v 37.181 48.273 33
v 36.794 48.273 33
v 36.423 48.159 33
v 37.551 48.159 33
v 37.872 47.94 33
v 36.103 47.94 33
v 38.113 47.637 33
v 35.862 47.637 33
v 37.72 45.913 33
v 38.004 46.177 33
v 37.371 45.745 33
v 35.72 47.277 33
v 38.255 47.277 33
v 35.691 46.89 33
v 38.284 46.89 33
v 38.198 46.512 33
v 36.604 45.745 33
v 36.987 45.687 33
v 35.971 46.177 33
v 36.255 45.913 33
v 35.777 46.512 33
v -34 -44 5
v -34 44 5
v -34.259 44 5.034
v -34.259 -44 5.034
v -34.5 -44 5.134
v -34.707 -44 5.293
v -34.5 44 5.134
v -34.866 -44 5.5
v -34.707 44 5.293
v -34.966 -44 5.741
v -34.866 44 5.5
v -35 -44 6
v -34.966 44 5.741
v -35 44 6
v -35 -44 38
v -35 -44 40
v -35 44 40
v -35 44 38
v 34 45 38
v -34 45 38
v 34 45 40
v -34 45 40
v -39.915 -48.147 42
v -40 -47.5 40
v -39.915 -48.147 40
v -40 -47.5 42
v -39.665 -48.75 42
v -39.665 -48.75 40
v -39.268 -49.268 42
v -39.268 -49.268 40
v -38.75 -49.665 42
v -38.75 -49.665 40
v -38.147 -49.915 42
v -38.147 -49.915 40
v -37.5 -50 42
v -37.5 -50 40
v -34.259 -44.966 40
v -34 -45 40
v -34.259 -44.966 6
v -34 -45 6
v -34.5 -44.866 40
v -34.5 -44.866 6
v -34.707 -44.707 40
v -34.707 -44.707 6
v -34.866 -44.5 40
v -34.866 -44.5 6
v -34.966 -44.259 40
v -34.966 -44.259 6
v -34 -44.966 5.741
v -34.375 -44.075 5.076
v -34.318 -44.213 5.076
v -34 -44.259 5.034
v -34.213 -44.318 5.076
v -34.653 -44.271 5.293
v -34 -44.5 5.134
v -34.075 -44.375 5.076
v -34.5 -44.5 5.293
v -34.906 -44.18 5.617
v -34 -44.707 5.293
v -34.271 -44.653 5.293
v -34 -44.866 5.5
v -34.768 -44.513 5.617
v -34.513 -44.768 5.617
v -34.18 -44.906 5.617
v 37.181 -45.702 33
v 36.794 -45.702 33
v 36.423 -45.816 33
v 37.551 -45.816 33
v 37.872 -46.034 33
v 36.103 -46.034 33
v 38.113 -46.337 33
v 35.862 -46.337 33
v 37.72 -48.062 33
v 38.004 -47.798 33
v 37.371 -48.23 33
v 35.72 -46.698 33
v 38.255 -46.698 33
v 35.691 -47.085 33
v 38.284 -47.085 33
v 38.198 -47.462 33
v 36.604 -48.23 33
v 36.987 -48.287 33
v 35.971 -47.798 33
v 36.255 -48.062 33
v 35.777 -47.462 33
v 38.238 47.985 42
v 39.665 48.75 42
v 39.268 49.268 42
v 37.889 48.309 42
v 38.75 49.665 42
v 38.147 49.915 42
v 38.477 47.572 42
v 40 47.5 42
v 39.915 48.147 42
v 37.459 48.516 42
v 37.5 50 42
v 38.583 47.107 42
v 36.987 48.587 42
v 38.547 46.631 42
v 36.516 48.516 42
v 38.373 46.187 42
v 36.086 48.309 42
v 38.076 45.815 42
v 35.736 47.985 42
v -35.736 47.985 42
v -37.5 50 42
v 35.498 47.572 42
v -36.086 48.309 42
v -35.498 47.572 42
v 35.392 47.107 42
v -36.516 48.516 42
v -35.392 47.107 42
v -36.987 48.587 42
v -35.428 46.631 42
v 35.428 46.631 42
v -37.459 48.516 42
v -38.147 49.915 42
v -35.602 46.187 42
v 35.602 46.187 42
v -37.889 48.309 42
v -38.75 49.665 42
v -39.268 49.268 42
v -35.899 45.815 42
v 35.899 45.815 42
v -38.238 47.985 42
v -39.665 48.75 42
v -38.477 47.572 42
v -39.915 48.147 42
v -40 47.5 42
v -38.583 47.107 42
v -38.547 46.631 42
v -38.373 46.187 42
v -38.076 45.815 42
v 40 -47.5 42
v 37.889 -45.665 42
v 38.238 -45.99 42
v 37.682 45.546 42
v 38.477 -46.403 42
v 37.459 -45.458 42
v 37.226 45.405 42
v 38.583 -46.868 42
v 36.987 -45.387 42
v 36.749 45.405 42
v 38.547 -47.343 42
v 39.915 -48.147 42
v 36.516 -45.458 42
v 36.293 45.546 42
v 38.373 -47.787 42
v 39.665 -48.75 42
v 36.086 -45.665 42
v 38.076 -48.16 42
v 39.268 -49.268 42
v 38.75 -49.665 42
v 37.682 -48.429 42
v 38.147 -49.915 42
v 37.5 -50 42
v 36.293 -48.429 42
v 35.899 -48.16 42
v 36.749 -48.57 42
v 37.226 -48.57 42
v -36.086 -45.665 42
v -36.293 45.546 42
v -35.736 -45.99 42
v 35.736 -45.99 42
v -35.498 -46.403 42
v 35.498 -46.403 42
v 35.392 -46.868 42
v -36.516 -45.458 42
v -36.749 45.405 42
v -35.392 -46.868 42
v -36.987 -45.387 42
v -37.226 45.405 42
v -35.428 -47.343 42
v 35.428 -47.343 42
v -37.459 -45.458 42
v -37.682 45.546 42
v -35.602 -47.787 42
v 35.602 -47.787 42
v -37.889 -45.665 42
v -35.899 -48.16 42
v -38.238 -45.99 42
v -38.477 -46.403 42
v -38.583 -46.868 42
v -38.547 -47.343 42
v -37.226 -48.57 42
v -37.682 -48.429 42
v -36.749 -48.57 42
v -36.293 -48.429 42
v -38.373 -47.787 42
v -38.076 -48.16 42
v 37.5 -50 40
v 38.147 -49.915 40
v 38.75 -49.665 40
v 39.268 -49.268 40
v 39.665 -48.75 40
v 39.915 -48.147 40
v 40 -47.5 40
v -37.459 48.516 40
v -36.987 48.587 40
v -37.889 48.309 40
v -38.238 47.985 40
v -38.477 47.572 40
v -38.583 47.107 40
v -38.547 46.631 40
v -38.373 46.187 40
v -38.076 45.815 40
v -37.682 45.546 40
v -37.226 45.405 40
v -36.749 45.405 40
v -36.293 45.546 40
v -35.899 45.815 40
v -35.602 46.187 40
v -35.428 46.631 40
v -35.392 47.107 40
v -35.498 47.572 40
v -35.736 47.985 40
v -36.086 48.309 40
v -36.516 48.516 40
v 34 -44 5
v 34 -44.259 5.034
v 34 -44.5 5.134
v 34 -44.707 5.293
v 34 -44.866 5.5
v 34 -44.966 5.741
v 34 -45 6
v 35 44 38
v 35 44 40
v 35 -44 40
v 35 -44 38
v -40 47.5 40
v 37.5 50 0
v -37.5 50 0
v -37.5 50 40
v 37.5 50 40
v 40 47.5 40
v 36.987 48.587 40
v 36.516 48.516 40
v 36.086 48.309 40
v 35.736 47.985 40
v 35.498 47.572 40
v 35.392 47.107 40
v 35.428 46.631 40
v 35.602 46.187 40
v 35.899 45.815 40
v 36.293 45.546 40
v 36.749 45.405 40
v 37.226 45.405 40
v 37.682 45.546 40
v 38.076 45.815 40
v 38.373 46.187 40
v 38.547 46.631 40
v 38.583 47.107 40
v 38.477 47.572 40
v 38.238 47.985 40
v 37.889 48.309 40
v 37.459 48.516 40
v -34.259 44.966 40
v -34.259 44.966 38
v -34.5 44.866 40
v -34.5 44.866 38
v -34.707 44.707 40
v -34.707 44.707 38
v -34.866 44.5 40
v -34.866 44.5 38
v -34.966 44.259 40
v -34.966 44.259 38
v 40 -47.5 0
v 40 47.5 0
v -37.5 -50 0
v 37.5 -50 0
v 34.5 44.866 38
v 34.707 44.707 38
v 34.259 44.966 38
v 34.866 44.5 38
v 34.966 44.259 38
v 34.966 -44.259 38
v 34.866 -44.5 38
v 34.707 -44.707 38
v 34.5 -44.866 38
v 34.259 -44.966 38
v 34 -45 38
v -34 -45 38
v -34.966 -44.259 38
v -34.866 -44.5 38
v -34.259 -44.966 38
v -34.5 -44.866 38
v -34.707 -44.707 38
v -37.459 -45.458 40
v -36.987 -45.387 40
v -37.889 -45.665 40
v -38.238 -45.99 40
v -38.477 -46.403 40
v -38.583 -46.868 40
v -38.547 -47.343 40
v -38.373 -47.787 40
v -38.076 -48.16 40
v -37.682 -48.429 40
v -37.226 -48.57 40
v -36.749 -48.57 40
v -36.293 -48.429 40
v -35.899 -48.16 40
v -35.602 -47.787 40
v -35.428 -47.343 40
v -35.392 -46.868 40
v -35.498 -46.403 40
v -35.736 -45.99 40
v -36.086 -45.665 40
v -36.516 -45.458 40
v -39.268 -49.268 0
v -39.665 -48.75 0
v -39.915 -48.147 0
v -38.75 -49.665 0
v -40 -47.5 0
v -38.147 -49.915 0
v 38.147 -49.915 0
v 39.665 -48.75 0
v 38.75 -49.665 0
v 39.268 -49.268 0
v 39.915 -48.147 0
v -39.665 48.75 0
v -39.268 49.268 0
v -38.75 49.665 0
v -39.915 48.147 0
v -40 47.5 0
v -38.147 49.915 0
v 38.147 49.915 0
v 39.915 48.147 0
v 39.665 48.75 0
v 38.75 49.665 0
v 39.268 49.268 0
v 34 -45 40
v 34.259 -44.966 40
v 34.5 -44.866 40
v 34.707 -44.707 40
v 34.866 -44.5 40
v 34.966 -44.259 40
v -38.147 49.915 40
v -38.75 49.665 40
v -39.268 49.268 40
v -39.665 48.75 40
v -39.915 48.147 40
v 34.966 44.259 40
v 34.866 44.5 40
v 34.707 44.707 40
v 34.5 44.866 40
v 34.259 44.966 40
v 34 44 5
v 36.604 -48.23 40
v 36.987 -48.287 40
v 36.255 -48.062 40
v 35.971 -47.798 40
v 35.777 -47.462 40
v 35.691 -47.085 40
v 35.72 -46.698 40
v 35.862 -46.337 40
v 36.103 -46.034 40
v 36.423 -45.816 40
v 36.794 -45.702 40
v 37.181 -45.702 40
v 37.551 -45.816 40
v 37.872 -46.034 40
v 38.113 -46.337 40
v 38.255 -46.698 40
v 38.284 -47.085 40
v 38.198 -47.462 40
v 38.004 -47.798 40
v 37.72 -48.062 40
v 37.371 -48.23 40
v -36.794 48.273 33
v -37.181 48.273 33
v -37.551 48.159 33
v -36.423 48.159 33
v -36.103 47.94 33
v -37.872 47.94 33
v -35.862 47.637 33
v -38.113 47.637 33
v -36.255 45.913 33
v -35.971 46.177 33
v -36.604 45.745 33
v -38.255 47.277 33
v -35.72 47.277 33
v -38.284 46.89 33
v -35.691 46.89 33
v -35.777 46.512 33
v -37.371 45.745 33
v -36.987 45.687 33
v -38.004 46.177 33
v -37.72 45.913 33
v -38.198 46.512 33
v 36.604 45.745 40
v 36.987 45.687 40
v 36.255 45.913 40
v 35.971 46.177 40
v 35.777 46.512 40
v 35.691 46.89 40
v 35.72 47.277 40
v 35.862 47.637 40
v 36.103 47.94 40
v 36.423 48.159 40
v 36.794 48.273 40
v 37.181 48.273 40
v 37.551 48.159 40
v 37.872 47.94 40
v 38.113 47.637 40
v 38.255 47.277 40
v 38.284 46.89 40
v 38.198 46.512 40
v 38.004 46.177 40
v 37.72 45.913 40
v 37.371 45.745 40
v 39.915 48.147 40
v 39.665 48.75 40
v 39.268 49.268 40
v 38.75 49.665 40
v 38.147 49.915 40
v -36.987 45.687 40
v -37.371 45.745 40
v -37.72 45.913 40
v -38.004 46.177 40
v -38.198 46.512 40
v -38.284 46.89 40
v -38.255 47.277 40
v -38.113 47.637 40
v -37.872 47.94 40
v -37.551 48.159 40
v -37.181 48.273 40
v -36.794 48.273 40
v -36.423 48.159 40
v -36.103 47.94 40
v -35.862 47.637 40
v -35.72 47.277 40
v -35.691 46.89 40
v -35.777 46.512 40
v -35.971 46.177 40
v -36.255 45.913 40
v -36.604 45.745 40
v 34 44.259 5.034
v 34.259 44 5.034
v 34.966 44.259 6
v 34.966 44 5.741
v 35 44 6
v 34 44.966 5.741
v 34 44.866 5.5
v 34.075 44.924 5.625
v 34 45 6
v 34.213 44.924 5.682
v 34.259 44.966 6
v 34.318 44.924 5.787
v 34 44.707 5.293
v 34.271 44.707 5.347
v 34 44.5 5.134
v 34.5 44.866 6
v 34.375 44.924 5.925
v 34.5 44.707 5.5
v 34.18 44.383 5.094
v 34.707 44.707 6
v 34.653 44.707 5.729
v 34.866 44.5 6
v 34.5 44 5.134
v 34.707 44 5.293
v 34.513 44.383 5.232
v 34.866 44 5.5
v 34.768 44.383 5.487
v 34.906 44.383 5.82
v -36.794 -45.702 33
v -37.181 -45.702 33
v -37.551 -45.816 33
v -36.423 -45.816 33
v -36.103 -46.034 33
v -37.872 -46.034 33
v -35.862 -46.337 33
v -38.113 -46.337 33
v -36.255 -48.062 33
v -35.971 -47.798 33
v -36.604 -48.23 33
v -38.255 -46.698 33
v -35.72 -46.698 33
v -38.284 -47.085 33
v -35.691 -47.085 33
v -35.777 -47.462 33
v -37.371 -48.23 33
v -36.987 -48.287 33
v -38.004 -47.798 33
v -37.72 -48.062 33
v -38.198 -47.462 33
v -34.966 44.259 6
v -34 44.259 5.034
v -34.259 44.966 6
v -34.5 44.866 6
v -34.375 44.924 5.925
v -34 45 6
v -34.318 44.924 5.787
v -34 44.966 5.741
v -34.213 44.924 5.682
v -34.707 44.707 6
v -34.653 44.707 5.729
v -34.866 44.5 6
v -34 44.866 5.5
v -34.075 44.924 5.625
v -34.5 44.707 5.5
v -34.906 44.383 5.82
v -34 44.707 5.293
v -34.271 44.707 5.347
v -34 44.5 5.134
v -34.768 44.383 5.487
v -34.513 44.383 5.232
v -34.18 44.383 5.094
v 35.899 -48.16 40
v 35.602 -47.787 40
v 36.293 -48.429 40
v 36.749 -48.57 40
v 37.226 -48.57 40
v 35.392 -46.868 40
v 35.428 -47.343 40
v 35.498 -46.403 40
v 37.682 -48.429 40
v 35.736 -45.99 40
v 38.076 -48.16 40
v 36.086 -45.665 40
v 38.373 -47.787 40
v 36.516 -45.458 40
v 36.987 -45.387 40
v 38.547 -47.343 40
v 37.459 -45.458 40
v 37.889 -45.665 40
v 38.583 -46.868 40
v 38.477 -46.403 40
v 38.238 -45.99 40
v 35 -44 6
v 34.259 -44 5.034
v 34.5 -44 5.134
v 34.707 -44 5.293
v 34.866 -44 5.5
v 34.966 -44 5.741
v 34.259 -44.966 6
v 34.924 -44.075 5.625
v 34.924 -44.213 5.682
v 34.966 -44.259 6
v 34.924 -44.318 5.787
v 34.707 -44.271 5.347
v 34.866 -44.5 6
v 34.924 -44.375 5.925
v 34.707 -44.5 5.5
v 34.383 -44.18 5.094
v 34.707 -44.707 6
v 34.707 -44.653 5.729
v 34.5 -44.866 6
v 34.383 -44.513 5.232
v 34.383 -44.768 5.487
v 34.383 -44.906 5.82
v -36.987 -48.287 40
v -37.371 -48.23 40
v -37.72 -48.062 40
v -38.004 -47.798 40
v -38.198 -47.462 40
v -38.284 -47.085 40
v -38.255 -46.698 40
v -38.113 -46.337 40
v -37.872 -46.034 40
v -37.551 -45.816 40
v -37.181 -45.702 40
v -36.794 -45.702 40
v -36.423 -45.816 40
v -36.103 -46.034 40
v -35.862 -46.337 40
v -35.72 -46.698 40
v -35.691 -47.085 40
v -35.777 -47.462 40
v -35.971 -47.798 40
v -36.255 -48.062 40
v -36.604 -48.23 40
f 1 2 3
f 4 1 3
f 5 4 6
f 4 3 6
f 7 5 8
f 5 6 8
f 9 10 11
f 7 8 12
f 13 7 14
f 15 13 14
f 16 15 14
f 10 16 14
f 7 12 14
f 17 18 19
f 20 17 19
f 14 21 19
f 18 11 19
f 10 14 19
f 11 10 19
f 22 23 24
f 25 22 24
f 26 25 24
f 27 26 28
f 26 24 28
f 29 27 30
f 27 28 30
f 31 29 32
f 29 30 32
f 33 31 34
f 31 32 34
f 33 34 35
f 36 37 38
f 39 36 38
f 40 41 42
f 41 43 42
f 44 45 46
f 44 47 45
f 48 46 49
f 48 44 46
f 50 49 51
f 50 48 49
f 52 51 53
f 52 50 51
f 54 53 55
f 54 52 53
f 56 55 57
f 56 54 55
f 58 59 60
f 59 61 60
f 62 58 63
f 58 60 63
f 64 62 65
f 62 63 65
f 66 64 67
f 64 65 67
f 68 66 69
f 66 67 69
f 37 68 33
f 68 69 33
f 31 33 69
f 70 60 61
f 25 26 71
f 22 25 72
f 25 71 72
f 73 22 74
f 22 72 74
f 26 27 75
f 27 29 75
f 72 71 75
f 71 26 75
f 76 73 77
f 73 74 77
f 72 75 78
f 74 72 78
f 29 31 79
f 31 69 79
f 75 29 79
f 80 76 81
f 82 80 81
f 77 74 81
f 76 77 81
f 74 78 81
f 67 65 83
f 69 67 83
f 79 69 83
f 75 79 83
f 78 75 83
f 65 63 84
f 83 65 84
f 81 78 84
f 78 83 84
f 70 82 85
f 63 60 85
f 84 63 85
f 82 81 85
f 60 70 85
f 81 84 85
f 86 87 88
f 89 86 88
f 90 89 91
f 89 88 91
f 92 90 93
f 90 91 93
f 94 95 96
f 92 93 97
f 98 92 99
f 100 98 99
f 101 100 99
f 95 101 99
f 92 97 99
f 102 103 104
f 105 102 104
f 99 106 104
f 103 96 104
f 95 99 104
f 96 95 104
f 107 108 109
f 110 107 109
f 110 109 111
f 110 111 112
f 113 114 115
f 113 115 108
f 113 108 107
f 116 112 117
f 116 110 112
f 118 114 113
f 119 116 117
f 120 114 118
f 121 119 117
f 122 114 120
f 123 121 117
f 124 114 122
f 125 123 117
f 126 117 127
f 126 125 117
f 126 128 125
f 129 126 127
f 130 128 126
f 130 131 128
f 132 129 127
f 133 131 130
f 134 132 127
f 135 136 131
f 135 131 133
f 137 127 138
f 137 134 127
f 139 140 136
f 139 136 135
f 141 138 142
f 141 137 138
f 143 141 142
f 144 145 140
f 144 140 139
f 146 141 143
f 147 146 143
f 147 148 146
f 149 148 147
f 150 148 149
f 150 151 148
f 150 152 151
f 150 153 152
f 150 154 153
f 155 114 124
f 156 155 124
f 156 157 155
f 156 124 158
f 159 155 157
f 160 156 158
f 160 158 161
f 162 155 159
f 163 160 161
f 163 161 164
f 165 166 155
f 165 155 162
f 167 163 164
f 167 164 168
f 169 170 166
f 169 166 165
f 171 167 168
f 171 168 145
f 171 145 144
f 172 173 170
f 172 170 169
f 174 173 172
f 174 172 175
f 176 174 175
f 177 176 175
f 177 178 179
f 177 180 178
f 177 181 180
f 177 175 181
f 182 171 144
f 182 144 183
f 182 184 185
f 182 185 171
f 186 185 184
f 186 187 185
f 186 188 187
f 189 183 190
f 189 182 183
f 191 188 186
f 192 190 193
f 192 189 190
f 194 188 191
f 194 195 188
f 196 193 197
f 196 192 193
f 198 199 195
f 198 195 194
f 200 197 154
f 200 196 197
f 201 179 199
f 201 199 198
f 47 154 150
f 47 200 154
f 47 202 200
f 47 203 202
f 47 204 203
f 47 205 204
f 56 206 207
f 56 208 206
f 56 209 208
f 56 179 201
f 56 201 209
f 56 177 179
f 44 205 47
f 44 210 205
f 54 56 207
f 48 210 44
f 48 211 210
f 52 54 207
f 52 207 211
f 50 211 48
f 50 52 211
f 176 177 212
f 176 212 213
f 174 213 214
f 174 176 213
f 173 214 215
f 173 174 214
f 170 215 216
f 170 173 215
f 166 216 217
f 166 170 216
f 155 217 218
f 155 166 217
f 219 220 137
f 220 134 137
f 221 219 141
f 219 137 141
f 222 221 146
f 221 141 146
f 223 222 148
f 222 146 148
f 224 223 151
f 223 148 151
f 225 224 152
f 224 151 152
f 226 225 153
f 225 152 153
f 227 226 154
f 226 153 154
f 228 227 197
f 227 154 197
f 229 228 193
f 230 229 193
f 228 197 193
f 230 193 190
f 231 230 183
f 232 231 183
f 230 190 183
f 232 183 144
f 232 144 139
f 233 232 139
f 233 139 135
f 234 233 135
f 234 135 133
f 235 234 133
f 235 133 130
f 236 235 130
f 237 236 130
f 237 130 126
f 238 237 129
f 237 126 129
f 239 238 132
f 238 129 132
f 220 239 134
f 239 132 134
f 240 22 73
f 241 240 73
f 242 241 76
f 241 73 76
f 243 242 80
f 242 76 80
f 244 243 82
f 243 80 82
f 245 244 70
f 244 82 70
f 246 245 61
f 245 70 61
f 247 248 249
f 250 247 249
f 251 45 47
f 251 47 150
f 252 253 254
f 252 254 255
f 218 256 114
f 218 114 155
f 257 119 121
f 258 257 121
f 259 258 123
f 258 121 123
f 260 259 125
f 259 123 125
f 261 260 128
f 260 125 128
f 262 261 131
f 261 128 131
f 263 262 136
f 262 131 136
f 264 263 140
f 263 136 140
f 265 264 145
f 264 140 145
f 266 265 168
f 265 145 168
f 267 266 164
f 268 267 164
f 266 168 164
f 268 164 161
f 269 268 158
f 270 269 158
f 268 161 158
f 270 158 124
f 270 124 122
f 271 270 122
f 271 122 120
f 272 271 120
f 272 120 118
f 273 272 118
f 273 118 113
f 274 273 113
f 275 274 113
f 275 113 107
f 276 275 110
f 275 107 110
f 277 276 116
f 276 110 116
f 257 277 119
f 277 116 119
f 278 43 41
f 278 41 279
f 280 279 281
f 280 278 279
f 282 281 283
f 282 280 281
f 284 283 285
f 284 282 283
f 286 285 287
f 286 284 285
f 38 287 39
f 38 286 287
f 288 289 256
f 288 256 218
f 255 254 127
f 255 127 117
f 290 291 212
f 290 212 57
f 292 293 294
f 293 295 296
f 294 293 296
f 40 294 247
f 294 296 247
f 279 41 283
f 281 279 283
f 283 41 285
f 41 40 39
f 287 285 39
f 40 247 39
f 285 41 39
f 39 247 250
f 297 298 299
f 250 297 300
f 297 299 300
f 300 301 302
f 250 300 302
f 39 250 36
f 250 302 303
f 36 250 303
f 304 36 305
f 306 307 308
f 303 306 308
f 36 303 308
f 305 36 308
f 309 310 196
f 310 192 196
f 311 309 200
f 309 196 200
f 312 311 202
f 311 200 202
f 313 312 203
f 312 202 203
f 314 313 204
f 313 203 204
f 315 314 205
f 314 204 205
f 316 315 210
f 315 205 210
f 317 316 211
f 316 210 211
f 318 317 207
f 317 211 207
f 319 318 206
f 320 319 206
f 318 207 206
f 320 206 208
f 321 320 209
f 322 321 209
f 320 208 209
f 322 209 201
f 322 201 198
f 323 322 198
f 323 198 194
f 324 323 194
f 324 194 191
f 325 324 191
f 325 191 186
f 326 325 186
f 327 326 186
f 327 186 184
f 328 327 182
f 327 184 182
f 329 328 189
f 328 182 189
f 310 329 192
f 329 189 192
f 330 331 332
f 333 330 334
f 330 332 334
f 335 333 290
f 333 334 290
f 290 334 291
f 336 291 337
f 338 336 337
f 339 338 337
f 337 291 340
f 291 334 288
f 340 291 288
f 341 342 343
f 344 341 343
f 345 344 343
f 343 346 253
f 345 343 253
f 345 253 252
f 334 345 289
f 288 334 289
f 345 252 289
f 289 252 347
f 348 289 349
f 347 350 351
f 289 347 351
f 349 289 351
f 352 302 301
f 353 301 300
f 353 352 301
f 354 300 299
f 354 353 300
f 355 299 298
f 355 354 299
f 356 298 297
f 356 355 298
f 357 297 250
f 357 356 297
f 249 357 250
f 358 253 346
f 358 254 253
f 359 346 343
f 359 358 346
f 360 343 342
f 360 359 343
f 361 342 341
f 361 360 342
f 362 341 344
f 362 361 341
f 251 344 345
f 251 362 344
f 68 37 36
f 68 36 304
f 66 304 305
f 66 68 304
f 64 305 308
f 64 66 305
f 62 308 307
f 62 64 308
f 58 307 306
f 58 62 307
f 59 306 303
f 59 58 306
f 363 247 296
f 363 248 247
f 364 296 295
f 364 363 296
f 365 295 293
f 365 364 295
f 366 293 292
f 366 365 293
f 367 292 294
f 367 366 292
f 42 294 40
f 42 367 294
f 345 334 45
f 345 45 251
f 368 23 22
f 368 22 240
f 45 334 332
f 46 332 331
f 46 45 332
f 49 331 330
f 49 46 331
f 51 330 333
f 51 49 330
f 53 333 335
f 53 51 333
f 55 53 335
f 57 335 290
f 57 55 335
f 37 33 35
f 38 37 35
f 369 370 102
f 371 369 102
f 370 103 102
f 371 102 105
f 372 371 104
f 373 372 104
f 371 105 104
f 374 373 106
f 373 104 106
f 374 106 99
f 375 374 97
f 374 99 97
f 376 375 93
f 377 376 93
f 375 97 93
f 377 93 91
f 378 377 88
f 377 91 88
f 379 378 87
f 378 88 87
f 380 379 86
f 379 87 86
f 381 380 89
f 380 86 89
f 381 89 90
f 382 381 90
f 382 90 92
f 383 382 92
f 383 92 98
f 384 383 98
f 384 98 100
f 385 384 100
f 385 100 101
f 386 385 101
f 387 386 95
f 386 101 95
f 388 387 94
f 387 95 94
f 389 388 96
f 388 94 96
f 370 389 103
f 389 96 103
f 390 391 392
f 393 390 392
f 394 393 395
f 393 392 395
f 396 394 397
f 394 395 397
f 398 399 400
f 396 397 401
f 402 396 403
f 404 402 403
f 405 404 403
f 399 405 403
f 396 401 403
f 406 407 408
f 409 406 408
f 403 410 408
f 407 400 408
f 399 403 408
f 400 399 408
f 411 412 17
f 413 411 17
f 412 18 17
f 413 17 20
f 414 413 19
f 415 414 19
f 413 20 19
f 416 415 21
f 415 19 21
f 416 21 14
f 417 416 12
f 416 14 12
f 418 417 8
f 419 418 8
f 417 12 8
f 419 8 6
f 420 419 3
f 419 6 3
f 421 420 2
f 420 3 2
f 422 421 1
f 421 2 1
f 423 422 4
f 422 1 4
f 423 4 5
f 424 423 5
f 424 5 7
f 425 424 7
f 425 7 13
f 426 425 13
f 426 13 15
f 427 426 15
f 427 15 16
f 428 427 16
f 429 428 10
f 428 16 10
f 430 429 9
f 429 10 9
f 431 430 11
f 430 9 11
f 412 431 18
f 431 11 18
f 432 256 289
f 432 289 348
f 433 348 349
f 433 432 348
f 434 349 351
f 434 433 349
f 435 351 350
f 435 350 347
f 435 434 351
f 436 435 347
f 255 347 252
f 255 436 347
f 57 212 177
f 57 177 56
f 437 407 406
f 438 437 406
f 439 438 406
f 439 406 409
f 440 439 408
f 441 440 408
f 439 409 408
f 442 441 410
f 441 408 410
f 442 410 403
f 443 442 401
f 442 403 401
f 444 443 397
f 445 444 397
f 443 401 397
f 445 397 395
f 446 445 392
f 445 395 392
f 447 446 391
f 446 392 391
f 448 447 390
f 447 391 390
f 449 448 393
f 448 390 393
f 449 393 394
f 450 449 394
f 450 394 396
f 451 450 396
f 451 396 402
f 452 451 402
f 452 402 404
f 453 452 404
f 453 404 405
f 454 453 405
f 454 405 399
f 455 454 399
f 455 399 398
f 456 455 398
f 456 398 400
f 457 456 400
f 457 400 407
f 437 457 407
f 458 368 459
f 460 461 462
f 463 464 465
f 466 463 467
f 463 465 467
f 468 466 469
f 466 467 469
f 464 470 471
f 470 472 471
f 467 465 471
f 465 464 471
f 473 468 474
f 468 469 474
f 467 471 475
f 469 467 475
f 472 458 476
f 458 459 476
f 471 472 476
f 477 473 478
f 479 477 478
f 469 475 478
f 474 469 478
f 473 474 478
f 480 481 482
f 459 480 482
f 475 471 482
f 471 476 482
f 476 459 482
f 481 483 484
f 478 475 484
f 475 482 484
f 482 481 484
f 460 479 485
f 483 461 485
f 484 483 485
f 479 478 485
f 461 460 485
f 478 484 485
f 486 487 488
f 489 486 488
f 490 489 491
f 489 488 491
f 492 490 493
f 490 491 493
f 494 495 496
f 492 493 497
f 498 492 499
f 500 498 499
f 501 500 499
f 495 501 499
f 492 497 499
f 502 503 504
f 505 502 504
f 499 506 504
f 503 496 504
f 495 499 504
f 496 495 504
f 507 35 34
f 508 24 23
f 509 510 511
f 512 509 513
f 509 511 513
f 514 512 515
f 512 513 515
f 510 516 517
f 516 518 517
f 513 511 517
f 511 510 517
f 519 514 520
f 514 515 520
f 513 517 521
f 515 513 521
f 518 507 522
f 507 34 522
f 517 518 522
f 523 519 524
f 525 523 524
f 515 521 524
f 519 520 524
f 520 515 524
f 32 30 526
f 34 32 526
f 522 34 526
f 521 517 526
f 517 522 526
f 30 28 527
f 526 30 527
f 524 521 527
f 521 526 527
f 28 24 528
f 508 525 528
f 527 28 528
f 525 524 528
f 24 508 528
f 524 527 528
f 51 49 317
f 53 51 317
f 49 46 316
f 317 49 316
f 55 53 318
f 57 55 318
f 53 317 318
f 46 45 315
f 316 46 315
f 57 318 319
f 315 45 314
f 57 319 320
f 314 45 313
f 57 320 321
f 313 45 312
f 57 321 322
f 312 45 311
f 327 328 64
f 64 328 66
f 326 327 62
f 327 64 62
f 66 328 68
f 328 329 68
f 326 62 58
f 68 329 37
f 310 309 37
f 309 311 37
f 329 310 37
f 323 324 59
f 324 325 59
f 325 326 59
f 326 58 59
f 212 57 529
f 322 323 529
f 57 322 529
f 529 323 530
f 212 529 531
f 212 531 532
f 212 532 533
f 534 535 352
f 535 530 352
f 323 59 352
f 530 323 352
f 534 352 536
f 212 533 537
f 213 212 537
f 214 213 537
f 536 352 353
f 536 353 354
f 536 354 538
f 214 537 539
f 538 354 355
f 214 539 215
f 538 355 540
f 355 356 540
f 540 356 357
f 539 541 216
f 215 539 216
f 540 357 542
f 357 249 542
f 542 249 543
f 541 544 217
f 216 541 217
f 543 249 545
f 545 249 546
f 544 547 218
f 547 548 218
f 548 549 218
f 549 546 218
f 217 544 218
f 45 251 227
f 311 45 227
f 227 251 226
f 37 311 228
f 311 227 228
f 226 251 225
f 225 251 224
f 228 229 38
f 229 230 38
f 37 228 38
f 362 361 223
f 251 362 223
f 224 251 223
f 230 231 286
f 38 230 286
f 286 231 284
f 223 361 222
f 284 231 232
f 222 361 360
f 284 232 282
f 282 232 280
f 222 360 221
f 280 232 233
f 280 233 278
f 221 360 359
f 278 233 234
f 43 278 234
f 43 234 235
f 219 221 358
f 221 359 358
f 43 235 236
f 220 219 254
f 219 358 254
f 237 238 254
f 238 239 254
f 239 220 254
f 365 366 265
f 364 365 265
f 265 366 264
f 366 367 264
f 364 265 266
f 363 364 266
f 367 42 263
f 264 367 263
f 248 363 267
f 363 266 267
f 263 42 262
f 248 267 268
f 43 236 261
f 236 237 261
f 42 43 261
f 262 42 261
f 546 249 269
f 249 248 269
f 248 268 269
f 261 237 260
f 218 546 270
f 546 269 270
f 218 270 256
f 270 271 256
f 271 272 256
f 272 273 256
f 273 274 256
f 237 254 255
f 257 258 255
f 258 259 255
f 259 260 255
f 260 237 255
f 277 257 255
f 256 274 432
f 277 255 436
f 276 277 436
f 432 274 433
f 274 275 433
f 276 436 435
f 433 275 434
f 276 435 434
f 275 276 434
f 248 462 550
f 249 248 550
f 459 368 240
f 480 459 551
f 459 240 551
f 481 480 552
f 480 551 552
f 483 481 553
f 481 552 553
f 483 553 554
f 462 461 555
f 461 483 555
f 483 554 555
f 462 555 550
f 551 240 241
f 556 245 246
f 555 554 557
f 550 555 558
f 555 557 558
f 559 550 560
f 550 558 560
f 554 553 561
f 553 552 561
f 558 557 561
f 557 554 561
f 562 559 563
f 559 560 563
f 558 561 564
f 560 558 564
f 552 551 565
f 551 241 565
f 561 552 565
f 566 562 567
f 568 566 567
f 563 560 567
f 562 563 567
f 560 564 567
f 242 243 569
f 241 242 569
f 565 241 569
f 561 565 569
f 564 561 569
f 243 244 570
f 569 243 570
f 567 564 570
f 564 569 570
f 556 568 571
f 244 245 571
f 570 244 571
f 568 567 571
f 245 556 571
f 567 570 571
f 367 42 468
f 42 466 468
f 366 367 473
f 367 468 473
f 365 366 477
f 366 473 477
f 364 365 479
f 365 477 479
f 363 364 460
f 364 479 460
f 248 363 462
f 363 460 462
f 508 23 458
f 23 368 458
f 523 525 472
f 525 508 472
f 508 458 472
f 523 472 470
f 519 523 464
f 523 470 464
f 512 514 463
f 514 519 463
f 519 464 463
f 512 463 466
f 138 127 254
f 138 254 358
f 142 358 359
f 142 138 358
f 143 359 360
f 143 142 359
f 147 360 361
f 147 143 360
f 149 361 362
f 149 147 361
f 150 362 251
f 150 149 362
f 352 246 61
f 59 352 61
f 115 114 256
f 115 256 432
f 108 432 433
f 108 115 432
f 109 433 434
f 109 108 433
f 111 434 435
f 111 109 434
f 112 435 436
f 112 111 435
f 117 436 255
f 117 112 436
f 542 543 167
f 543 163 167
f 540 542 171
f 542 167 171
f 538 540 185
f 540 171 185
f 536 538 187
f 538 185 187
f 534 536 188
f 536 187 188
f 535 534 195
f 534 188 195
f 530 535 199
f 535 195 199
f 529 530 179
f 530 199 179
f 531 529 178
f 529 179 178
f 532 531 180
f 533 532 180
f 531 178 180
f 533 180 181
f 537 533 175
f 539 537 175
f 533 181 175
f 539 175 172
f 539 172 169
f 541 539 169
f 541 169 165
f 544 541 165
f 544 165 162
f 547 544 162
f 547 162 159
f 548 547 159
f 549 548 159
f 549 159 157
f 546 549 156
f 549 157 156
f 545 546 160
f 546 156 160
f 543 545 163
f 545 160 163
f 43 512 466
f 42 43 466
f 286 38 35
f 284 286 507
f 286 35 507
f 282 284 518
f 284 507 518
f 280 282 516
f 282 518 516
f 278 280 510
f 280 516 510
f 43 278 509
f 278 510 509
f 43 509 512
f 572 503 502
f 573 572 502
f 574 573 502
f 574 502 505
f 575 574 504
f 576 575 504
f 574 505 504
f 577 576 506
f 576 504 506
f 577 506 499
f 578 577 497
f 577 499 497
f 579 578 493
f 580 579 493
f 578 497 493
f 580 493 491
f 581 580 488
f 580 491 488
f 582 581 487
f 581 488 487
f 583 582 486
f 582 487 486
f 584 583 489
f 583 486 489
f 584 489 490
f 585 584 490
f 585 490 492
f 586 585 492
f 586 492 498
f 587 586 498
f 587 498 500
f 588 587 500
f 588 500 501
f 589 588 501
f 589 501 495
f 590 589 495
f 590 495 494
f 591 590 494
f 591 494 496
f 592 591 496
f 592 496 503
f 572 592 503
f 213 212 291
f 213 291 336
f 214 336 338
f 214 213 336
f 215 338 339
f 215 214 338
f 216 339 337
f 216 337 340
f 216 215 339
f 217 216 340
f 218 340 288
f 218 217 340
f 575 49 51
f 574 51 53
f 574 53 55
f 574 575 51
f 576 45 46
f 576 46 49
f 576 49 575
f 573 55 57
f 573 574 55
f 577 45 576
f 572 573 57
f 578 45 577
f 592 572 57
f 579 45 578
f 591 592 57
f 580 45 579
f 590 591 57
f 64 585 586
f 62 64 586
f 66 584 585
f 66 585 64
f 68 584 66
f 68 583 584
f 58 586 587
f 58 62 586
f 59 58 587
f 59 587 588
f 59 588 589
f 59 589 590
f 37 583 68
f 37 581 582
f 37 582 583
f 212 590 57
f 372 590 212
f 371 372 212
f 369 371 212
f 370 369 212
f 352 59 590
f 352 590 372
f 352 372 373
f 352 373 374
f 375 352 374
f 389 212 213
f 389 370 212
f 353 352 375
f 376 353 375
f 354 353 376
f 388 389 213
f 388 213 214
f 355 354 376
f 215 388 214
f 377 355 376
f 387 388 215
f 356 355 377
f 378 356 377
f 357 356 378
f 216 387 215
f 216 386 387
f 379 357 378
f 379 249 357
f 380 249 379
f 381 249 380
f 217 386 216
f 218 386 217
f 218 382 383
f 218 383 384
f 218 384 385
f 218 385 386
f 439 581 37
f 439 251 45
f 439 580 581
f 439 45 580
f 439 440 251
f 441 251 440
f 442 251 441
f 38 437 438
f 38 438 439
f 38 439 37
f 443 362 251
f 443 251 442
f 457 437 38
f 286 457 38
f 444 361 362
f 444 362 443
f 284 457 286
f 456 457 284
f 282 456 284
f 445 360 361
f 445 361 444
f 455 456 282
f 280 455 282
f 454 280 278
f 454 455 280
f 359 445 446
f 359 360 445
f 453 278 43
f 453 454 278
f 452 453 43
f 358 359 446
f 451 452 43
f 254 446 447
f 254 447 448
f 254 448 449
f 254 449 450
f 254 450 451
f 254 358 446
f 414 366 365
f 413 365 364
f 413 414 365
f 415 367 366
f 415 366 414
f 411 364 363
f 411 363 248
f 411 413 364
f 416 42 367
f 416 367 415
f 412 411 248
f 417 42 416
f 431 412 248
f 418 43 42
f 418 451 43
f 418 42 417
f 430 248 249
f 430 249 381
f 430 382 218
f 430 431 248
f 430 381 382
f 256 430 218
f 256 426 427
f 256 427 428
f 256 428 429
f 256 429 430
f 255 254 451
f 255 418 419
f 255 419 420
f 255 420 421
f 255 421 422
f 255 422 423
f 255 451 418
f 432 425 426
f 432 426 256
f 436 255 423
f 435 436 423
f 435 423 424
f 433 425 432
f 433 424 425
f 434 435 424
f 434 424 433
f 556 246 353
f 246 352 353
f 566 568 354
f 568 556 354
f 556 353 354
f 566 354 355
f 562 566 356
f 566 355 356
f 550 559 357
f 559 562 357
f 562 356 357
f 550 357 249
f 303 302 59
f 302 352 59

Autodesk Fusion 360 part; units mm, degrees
sketch "Sketch1" plane through (0, 0, 0) normal (0, 0, 1) x (1, 0, 0)
  line L0 (40, -50) -> (-40, -50)
  line L1 (-40, -50) -> (-40, 50)
  line L2 (-40, 50) -> (40, 50)
  line L3 (40, 50) -> (40, -50)
  line L4 (40, -50) -> (-40, 50) construction
  line L5 (-40, -50) -> (40, 50) construction
  dimension "d1" = 80
  dimension "d2" = 100
extrude "Extrude1" add sketch "Sketch1" along normal blind 40 makes body 1
shell "Shell1" thickness 5 removed faces 1 at (13.3333, -16.6667, 40) on bodies 1
fillet "Fillet1" radius 2.5 1 edges at (40, -50, 20) on bodies 1
fillet "Fillet2" radius 2.5 1 edges at (40, 50, 20) on bodies 1
fillet "Fillet3" radius 2.5 1 edges at (-40, 50, 20) on bodies 1
fillet "Fillet4" radius 2.5 1 edges at (-40, -50, 20) on bodies 1
fillet "Fillet5" radius 1 8 edges at (-35, -45, 22.5) (0, -45, 5) (-35, 0, 5) (35, -45, 22.5) (35, 0, 5) (35, 45, 22.5) (0, 45, 5) (-35, 45, 22.5) on bodies 1
sketch "Sketch2" plane through (0, 0, 40) normal (0, 0, 1) x (-1, 0, 0)
  arc A0 (40, 47.5) -> (37.5, 50) centre (37.5, 47.5) ccw
  line L0 (37.5, 50) -> (-37.5, 50)
  arc A1 (-37.5, 50) -> (-40, 47.5) centre (-37.5, 47.5) ccw
  line L1 (-40, 47.5) -> (-40, -47.5)
  arc A2 (-40, -47.5) -> (-37.5, -50) centre (-37.5, -47.5) ccw
  line L2 (-37.5, -50) -> (37.5, -50)
  arc A3 (37.5, -50) -> (40, -47.5) centre (37.5, -47.5) ccw
  line L3 (40, -47.5) -> (40, 47.5)
  line L4 (-35, -44) -> (-35, 44)
  arc A4 (-34, 45) -> (-35, 44) centre (-34, 44) ccw
  line L5 (-34, 45) -> (34, 45)
  arc A5 (35, 44) -> (34, 45) centre (34, 44) ccw
  line L6 (35, 44) -> (35, -44)
  arc A6 (34, -45) -> (35, -44) centre (34, -44) ccw
  line L7 (34, -45) -> (-34, -45)
  arc A7 (-35, -44) -> (-34, -45) centre (-34, -44) ccw
  line L8 (-39.2678, 49.2678) -> (-34.7071, 49.2678) construction
  line L9 (-34.7071, 49.2678) -> (-34.7071, 44.7071) construction
  line L10 (-34.7071, 44.7071) -> (-39.2678, 44.7071) construction
  line L11 (-39.2678, 44.7071) -> (-39.2678, 49.2678) construction
  line L12 (34.7071, -44.7071) -> (39.2678, -44.7071) construction
  line L13 (39.2678, -44.7071) -> (39.2678, -49.2678) construction
  line L14 (39.2678, -49.2678) -> (34.7071, -49.2678) construction
  line L15 (34.7071, -49.2678) -> (34.7071, -44.7071) construction
  line L16 (36.9874, -46.9874) -> (-36.9874, -46.9874)
  line L17 (-36.9874, -46.9874) -> (-36.9874, 46.9874)
  line L18 (-36.9874, 46.9874) -> (36.9874, 46.9874)
  line L19 (36.9874, 46.9874) -> (36.9874, -46.9874)
extrude "Extrude2" add sketch "Sketch2" along normal blind 2 contours A0 L0 A1 L1 A2 L2 A3 L3 | L4 A4 L5 A5 L6 A6 L7 A7 | L16 L17 L18 L19 bodies 1
ref_plane "WorkPlane1" through (0, 0, 40) normal (0, 0, 1) x (-1, 0, 0)
split "Split1" by plane through (0, 0, 40) normal (0, 0, 1) bodies 1 makes body 2 at (13.3333, 15.8333, 42)
sketch "Sketch3" plane through (0, 0, 42) normal (0, 0, 1) x (-1, 0, 0)
  line L0 (40, -47.5) -> (40, 47.5)
  arc A0 (40, 47.5) -> (37.5, 50) centre (37.5, 47.5) ccw
  line L1 (37.5, 50) -> (-37.5, 50)
  arc A1 (-37.5, 50) -> (-40, 47.5) centre (-37.5, 47.5) ccw
  line L2 (-40, 47.5) -> (-40, -47.5)
  arc A2 (-40, -47.5) -> (-37.5, -50) centre (-37.5, -47.5) ccw
  line L3 (-37.5, -50) -> (37.5, -50)
  arc A3 (37.5, -50) -> (40, -47.5) centre (37.5, -47.5) ccw
sketch "Sketch4" plane through (0, 0, 40) normal (0, 0, 1) x (-1, 0, 0)
  line L0 (37, 47) -> (-37, 47) construction
  line L1 (-37, 47) -> (-37, -47) construction
  line L2 (-37, -47) -> (37, -47) construction
  line L3 (37, -47) -> (37, 47) construction
  line L4 (-34, -45) -> (34, -45)
  line L5 (35, -44) -> (35, 44)
  line L6 (34, 45) -> (-34, 45)
  line L7 (-35, 44) -> (-35, -44)
  line L8 (-35, -45) -> (35, 45) construction
  line L9 (35, -45) -> (-35, 45) construction
  arc A0 (35, 44) -> (34, 45) centre (34, 44) ccw
  arc A1 (34, -45) -> (35, -44) centre (34, -44) ccw
  arc A2 (-35, -44) -> (-34, -45) centre (-34, -44) ccw
  arc A3 (-34, 45) -> (-35, 44) centre (-34, 44) ccw
  dimension "d29" = 70
  dimension "d30" = 90
  dimension "d31" = 1
  dimension "d32" = 1
  dimension "d33" = 1
hole "Hole5" at (-36.9874, 46.9874, 40) at (36.9874, 46.9874, 40) at (36.9874, -46.9874, 40) at (-36.9874, -46.9874, 40) direction (0, 0, -1) diameter 2.6 depth 7 tip angle 180 bodies 1
extrude "Extrude4" add sketch "Sketch2" against normal blind 2 contours L4 A4 L5 A5 L6 A6 L7 A7 bodies 2
hole "Hole6" at (-36.9874, 46.9874, 40) at (36.9874, 46.9874, 40) at (36.9874, -46.9874, 40) at (-36.9874, -46.9874, 40) direction (0, 0, 1) diameter 3.2 depth 2 tip angle 180 bodies 2
equation "d1 = BoxDepth"
equation "d2 = BoxWidth"
equation "BoxWidth = 100 mm"
equation "BoxDepth = 80 mm"
equation "BoxHeight = 40 mm"
equation "WallThickness = 5 mm"
equation "d9 = WallThickness"
equation "OuterFillet = 2.5 mm"
equation "d12 = OuterFillet"
equation "d14 = OuterFillet"
equation "d16 = OuterFillet"
equation "d18 = OuterFillet"
equation "InnerFillet = 1 mm"
equation "d21 = InnerFillet"
equation "d31 = InnerFillet"
equation "d32 = InnerFillet"
equation "d33 = InnerFillet"
